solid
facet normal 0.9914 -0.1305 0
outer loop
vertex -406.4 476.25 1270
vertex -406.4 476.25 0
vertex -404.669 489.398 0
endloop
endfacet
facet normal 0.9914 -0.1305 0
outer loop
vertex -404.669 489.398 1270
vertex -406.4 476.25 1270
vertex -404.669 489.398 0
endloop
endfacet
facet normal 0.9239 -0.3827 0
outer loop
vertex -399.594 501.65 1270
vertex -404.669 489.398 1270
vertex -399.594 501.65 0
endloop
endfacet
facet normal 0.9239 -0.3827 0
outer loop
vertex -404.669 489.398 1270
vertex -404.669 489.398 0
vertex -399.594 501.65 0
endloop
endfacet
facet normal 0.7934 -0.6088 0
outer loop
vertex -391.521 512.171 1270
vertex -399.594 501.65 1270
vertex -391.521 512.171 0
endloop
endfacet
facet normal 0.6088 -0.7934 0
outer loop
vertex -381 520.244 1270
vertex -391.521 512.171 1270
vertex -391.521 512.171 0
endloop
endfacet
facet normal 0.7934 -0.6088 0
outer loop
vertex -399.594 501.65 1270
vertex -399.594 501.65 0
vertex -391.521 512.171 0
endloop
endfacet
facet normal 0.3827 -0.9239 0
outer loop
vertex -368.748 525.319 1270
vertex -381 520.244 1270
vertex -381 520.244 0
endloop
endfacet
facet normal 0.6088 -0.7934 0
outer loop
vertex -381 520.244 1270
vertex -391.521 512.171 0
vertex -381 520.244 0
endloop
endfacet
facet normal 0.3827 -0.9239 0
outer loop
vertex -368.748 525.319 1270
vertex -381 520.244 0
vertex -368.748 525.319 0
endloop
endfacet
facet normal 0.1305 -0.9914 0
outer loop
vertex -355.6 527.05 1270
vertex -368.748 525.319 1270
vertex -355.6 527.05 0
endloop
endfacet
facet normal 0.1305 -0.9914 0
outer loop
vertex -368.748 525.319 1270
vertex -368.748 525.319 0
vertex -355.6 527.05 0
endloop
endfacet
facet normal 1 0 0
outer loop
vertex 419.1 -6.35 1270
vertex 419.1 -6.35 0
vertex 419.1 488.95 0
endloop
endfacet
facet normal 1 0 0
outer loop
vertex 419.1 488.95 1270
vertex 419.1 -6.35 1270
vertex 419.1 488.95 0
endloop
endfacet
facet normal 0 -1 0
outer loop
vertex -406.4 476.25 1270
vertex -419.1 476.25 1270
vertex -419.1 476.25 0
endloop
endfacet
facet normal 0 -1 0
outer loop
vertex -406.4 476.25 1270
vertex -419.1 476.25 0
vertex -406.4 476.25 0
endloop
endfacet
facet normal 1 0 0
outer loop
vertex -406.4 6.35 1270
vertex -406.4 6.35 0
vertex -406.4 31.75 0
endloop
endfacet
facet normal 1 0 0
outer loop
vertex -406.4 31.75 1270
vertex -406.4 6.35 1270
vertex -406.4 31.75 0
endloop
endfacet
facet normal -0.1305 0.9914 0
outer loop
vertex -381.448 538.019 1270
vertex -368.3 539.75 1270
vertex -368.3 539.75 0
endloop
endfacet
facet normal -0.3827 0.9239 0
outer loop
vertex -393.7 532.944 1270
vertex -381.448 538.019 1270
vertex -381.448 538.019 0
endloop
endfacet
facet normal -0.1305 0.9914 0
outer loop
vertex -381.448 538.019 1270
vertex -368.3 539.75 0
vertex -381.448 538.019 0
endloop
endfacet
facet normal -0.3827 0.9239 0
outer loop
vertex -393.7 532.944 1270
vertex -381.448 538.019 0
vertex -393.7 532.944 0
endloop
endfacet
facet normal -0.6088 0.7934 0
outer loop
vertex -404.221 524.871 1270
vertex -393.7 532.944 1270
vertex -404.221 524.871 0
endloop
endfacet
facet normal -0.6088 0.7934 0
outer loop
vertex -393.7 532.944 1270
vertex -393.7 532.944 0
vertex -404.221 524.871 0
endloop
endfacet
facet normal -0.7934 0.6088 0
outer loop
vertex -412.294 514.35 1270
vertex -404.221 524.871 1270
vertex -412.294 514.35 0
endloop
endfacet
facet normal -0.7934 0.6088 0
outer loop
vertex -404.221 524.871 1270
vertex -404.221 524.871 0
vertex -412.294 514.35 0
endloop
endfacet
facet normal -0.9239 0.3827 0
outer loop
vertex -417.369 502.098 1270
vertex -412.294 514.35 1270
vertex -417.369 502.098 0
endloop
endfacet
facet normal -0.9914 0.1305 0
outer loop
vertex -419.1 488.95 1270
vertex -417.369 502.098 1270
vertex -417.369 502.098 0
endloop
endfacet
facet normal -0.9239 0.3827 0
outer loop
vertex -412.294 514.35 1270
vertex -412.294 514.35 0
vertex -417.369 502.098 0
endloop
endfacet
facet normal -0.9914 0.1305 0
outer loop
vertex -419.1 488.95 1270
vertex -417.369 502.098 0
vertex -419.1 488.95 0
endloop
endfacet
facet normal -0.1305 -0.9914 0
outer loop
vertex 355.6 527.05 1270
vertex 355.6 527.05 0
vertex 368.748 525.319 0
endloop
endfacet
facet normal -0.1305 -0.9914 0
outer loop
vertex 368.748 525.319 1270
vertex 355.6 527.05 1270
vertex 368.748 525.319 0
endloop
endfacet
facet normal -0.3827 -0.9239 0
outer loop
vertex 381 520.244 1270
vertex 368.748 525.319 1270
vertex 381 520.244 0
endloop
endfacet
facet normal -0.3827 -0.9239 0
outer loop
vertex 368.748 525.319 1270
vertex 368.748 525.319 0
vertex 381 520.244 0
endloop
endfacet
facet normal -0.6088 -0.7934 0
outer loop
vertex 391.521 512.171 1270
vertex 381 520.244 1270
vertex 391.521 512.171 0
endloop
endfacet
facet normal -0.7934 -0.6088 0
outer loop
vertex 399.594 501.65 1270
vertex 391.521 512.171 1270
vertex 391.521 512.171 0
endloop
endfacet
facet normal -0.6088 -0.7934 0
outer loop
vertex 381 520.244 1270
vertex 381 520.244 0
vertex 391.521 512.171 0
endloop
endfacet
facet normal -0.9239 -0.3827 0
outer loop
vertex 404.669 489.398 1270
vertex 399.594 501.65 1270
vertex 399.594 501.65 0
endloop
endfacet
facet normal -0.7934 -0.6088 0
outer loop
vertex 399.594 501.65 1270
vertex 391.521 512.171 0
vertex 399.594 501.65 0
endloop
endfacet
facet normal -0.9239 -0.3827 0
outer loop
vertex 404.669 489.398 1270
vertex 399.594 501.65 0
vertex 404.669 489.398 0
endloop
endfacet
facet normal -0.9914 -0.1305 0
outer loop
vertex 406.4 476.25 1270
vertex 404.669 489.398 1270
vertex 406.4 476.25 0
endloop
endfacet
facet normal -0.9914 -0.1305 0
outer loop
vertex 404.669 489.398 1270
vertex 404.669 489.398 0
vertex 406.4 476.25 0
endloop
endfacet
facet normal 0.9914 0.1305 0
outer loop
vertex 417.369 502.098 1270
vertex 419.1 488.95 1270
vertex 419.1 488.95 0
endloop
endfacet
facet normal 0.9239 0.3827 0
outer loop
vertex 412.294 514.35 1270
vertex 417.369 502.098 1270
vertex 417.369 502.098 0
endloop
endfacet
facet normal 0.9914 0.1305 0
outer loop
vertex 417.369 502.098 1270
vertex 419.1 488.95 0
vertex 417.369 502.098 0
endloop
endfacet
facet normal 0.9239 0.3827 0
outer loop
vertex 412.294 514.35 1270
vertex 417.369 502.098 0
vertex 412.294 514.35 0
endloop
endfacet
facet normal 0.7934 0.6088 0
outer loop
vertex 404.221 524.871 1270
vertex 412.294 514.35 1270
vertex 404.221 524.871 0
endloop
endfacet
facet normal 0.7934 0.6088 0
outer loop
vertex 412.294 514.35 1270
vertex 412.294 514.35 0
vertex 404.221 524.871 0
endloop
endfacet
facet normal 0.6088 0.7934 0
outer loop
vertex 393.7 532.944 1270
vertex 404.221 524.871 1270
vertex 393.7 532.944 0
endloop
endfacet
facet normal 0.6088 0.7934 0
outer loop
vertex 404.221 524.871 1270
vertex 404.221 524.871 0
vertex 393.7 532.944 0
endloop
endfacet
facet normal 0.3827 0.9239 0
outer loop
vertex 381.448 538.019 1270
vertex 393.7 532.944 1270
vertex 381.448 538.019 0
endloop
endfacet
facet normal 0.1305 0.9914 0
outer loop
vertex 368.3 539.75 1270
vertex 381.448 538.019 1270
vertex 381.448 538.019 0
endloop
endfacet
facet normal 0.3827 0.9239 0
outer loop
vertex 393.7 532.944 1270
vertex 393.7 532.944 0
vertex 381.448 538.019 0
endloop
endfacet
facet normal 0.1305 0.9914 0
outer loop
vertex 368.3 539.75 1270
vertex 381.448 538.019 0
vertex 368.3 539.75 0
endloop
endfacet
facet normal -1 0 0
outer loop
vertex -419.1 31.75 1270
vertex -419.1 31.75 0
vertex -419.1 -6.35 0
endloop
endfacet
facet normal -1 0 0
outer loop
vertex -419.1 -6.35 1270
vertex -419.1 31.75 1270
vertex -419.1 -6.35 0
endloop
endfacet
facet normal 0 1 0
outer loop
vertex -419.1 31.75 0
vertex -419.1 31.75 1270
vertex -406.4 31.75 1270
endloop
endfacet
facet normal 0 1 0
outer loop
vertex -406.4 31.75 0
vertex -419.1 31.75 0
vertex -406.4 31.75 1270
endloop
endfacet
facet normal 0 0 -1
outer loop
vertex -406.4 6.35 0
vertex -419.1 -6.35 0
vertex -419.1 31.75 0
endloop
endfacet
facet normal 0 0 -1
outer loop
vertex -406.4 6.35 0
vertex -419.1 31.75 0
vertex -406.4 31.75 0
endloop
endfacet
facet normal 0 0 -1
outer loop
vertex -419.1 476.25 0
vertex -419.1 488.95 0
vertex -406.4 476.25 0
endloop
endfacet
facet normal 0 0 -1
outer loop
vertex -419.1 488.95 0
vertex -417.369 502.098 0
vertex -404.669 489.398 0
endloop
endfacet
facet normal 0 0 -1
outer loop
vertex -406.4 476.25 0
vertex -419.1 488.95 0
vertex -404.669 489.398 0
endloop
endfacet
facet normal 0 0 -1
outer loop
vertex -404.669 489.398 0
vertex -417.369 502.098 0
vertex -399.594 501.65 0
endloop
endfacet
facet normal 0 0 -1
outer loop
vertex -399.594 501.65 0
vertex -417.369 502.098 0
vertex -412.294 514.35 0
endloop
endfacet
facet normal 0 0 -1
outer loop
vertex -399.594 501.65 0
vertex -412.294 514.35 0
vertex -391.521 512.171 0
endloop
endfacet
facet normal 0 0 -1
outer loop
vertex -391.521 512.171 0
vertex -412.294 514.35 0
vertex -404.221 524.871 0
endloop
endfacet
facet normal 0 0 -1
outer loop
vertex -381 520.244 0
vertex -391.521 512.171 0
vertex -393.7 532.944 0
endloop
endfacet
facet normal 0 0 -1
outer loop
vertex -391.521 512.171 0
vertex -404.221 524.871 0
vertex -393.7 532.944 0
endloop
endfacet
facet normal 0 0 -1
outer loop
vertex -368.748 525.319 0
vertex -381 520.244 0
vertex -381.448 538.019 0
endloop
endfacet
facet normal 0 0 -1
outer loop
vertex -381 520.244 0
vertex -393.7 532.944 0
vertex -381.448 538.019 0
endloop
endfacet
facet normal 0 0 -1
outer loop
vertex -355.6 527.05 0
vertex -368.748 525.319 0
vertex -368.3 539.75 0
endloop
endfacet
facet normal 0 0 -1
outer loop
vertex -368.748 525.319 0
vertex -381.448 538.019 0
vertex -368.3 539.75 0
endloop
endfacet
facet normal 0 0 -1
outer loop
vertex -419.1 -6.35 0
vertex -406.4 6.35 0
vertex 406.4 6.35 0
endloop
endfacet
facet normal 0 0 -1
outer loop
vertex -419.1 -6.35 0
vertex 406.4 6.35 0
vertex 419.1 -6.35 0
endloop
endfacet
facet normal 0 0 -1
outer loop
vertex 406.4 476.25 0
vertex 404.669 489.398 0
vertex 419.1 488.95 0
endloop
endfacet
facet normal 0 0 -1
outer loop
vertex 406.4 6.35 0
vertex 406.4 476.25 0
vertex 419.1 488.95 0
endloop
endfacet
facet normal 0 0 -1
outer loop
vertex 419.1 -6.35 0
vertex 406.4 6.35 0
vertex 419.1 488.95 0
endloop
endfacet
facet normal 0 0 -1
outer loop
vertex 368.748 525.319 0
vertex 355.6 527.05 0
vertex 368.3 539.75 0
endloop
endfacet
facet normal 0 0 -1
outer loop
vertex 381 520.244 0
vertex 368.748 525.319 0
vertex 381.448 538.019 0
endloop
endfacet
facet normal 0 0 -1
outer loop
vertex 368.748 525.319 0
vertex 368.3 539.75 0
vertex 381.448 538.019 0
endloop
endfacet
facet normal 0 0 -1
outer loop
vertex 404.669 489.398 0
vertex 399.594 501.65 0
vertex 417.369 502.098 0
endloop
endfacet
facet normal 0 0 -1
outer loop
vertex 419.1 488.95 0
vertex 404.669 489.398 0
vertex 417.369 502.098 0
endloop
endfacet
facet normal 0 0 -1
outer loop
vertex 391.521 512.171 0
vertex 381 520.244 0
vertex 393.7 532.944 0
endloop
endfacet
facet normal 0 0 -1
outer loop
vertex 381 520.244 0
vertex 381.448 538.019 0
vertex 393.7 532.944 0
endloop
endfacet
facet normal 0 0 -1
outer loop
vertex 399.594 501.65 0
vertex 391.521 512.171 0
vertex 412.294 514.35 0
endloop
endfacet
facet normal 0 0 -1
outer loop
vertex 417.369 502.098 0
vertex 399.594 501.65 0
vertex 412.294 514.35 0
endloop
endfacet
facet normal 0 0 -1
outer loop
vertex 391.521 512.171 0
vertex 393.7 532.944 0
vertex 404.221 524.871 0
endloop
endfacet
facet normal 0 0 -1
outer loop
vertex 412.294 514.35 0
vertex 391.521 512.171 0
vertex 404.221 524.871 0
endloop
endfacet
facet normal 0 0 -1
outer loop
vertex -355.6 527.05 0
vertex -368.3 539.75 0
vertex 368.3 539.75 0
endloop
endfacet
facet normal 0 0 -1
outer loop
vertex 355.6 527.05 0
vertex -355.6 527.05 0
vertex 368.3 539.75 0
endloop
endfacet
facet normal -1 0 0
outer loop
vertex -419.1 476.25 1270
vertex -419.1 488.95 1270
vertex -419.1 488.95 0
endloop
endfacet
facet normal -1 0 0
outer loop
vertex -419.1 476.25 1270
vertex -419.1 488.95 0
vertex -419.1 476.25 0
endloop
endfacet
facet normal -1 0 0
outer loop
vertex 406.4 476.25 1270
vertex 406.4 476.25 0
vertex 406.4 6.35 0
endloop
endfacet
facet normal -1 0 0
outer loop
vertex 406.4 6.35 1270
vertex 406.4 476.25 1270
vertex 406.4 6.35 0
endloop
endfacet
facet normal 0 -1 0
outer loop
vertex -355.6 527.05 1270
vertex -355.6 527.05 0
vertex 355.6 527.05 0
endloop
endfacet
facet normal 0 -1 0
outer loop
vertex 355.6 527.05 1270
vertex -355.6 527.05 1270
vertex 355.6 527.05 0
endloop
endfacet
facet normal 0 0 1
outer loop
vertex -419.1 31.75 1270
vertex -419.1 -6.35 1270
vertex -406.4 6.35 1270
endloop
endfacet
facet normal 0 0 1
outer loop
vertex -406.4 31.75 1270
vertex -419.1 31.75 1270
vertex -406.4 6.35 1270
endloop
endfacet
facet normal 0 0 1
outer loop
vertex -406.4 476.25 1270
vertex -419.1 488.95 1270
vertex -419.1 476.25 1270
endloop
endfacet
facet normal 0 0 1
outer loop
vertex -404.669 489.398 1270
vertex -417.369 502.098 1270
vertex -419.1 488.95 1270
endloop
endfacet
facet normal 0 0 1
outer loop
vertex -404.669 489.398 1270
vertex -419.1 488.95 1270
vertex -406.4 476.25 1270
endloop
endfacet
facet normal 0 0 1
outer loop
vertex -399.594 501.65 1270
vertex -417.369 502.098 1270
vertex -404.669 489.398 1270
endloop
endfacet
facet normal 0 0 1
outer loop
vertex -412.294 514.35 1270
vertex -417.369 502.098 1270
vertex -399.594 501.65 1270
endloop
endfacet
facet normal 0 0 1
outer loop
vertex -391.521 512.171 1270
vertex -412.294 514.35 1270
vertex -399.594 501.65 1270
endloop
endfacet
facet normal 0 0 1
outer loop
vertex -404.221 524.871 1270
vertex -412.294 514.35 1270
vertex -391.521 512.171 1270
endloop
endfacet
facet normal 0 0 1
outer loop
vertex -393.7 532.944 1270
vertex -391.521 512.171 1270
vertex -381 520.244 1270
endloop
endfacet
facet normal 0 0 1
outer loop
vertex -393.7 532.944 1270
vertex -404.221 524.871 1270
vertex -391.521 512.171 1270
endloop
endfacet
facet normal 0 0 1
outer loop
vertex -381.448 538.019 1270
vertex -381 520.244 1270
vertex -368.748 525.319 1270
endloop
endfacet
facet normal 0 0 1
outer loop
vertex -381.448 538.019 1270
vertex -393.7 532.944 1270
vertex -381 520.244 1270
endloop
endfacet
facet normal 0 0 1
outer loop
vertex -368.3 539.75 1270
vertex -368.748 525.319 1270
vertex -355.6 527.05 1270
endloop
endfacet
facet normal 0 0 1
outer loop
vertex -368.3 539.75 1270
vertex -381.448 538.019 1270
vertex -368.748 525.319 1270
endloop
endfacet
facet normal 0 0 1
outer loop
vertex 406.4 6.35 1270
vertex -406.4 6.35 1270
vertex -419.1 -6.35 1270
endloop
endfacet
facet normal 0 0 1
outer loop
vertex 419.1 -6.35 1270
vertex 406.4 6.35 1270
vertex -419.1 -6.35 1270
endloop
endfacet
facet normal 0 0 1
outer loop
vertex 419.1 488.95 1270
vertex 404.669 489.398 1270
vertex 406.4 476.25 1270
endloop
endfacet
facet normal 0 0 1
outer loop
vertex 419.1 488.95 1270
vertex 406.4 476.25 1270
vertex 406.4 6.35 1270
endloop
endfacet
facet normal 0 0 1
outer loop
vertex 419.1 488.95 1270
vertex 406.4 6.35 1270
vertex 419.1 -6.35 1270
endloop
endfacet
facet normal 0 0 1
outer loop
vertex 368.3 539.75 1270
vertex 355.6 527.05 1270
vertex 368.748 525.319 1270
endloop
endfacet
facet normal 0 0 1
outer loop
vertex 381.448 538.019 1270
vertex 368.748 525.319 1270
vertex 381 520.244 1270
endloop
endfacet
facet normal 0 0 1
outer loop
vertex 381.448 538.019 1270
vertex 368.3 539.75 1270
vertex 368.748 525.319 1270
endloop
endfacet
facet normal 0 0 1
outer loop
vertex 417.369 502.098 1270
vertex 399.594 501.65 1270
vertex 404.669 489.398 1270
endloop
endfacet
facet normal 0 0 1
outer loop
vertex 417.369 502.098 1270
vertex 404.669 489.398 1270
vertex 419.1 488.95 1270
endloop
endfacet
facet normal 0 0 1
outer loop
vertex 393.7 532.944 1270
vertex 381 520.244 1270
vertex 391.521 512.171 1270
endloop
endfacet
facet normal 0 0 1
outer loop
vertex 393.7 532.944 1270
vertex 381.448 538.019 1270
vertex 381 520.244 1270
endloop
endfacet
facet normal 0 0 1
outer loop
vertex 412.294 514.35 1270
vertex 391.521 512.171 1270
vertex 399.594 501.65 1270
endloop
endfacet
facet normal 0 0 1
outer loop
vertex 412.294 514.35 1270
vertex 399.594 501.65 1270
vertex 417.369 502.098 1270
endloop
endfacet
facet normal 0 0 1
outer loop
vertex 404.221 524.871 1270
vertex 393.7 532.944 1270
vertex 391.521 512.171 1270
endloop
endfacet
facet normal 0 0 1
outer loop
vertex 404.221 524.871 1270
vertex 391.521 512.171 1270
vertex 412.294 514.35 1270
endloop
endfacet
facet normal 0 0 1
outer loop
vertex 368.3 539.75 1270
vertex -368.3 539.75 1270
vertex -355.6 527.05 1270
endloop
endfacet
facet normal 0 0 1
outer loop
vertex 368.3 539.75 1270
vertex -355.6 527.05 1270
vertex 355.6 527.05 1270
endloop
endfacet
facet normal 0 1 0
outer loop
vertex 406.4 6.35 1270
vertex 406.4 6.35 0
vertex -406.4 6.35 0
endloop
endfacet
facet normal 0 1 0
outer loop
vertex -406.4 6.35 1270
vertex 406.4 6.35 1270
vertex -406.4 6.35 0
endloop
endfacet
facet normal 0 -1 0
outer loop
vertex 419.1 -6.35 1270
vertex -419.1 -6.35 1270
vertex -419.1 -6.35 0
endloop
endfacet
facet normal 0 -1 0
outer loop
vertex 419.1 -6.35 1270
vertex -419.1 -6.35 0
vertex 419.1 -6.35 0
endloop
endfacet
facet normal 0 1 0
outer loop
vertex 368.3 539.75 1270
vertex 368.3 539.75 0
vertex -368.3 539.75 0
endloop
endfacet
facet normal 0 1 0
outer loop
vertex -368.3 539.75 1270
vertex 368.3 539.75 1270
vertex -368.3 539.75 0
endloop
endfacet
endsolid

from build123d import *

# Parameters (mm, degrees)
F0_W     = 12.7
F0_H     = 25.4
F1_DEPTH = 1270


with BuildPart() as f1:
    # F0 (on Top) → F1 (new body)
    with BuildSketch(Plane.XY):
        with Locations((-412.75, 19.05)):
            Rectangle(F0_W, F0_H)
        Polygon((-406.4, 6.35), (-419.1, 6.35), (-419.1, -6.35), (419.1, -6.35), (419.1, 6.35), (406.4, 6.35), align=None)
        with BuildLine():
            Line((406.4, 476.25), (406.4, 6.35))
            Line((406.4, 6.35), (419.1, 6.35))
            Line((419.1, 6.35), (419.1, 488.95))
            ThreePointArc((419.1, 488.95), (404.221024, 524.871024), (368.3, 539.75))
            Line((368.3, 539.75), (-368.3, 539.75))
            ThreePointArc((-368.3, 539.75), (-404.221024, 524.871024), (-419.1, 488.95))
            Line((-419.1, 488.95), (-419.1, 476.25))
            Line((-419.1, 476.25), (-406.4, 476.25))
            ThreePointArc((-406.4, 476.25), (-391.521024, 512.171024), (-355.6, 527.05))
            Line((-355.6, 527.05), (355.6, 527.05))
            ThreePointArc((355.6, 527.05), (391.521024, 512.171024), (406.4, 476.25))
        make_face()
    extrude(amount=F1_DEPTH)


solid = f1.part
